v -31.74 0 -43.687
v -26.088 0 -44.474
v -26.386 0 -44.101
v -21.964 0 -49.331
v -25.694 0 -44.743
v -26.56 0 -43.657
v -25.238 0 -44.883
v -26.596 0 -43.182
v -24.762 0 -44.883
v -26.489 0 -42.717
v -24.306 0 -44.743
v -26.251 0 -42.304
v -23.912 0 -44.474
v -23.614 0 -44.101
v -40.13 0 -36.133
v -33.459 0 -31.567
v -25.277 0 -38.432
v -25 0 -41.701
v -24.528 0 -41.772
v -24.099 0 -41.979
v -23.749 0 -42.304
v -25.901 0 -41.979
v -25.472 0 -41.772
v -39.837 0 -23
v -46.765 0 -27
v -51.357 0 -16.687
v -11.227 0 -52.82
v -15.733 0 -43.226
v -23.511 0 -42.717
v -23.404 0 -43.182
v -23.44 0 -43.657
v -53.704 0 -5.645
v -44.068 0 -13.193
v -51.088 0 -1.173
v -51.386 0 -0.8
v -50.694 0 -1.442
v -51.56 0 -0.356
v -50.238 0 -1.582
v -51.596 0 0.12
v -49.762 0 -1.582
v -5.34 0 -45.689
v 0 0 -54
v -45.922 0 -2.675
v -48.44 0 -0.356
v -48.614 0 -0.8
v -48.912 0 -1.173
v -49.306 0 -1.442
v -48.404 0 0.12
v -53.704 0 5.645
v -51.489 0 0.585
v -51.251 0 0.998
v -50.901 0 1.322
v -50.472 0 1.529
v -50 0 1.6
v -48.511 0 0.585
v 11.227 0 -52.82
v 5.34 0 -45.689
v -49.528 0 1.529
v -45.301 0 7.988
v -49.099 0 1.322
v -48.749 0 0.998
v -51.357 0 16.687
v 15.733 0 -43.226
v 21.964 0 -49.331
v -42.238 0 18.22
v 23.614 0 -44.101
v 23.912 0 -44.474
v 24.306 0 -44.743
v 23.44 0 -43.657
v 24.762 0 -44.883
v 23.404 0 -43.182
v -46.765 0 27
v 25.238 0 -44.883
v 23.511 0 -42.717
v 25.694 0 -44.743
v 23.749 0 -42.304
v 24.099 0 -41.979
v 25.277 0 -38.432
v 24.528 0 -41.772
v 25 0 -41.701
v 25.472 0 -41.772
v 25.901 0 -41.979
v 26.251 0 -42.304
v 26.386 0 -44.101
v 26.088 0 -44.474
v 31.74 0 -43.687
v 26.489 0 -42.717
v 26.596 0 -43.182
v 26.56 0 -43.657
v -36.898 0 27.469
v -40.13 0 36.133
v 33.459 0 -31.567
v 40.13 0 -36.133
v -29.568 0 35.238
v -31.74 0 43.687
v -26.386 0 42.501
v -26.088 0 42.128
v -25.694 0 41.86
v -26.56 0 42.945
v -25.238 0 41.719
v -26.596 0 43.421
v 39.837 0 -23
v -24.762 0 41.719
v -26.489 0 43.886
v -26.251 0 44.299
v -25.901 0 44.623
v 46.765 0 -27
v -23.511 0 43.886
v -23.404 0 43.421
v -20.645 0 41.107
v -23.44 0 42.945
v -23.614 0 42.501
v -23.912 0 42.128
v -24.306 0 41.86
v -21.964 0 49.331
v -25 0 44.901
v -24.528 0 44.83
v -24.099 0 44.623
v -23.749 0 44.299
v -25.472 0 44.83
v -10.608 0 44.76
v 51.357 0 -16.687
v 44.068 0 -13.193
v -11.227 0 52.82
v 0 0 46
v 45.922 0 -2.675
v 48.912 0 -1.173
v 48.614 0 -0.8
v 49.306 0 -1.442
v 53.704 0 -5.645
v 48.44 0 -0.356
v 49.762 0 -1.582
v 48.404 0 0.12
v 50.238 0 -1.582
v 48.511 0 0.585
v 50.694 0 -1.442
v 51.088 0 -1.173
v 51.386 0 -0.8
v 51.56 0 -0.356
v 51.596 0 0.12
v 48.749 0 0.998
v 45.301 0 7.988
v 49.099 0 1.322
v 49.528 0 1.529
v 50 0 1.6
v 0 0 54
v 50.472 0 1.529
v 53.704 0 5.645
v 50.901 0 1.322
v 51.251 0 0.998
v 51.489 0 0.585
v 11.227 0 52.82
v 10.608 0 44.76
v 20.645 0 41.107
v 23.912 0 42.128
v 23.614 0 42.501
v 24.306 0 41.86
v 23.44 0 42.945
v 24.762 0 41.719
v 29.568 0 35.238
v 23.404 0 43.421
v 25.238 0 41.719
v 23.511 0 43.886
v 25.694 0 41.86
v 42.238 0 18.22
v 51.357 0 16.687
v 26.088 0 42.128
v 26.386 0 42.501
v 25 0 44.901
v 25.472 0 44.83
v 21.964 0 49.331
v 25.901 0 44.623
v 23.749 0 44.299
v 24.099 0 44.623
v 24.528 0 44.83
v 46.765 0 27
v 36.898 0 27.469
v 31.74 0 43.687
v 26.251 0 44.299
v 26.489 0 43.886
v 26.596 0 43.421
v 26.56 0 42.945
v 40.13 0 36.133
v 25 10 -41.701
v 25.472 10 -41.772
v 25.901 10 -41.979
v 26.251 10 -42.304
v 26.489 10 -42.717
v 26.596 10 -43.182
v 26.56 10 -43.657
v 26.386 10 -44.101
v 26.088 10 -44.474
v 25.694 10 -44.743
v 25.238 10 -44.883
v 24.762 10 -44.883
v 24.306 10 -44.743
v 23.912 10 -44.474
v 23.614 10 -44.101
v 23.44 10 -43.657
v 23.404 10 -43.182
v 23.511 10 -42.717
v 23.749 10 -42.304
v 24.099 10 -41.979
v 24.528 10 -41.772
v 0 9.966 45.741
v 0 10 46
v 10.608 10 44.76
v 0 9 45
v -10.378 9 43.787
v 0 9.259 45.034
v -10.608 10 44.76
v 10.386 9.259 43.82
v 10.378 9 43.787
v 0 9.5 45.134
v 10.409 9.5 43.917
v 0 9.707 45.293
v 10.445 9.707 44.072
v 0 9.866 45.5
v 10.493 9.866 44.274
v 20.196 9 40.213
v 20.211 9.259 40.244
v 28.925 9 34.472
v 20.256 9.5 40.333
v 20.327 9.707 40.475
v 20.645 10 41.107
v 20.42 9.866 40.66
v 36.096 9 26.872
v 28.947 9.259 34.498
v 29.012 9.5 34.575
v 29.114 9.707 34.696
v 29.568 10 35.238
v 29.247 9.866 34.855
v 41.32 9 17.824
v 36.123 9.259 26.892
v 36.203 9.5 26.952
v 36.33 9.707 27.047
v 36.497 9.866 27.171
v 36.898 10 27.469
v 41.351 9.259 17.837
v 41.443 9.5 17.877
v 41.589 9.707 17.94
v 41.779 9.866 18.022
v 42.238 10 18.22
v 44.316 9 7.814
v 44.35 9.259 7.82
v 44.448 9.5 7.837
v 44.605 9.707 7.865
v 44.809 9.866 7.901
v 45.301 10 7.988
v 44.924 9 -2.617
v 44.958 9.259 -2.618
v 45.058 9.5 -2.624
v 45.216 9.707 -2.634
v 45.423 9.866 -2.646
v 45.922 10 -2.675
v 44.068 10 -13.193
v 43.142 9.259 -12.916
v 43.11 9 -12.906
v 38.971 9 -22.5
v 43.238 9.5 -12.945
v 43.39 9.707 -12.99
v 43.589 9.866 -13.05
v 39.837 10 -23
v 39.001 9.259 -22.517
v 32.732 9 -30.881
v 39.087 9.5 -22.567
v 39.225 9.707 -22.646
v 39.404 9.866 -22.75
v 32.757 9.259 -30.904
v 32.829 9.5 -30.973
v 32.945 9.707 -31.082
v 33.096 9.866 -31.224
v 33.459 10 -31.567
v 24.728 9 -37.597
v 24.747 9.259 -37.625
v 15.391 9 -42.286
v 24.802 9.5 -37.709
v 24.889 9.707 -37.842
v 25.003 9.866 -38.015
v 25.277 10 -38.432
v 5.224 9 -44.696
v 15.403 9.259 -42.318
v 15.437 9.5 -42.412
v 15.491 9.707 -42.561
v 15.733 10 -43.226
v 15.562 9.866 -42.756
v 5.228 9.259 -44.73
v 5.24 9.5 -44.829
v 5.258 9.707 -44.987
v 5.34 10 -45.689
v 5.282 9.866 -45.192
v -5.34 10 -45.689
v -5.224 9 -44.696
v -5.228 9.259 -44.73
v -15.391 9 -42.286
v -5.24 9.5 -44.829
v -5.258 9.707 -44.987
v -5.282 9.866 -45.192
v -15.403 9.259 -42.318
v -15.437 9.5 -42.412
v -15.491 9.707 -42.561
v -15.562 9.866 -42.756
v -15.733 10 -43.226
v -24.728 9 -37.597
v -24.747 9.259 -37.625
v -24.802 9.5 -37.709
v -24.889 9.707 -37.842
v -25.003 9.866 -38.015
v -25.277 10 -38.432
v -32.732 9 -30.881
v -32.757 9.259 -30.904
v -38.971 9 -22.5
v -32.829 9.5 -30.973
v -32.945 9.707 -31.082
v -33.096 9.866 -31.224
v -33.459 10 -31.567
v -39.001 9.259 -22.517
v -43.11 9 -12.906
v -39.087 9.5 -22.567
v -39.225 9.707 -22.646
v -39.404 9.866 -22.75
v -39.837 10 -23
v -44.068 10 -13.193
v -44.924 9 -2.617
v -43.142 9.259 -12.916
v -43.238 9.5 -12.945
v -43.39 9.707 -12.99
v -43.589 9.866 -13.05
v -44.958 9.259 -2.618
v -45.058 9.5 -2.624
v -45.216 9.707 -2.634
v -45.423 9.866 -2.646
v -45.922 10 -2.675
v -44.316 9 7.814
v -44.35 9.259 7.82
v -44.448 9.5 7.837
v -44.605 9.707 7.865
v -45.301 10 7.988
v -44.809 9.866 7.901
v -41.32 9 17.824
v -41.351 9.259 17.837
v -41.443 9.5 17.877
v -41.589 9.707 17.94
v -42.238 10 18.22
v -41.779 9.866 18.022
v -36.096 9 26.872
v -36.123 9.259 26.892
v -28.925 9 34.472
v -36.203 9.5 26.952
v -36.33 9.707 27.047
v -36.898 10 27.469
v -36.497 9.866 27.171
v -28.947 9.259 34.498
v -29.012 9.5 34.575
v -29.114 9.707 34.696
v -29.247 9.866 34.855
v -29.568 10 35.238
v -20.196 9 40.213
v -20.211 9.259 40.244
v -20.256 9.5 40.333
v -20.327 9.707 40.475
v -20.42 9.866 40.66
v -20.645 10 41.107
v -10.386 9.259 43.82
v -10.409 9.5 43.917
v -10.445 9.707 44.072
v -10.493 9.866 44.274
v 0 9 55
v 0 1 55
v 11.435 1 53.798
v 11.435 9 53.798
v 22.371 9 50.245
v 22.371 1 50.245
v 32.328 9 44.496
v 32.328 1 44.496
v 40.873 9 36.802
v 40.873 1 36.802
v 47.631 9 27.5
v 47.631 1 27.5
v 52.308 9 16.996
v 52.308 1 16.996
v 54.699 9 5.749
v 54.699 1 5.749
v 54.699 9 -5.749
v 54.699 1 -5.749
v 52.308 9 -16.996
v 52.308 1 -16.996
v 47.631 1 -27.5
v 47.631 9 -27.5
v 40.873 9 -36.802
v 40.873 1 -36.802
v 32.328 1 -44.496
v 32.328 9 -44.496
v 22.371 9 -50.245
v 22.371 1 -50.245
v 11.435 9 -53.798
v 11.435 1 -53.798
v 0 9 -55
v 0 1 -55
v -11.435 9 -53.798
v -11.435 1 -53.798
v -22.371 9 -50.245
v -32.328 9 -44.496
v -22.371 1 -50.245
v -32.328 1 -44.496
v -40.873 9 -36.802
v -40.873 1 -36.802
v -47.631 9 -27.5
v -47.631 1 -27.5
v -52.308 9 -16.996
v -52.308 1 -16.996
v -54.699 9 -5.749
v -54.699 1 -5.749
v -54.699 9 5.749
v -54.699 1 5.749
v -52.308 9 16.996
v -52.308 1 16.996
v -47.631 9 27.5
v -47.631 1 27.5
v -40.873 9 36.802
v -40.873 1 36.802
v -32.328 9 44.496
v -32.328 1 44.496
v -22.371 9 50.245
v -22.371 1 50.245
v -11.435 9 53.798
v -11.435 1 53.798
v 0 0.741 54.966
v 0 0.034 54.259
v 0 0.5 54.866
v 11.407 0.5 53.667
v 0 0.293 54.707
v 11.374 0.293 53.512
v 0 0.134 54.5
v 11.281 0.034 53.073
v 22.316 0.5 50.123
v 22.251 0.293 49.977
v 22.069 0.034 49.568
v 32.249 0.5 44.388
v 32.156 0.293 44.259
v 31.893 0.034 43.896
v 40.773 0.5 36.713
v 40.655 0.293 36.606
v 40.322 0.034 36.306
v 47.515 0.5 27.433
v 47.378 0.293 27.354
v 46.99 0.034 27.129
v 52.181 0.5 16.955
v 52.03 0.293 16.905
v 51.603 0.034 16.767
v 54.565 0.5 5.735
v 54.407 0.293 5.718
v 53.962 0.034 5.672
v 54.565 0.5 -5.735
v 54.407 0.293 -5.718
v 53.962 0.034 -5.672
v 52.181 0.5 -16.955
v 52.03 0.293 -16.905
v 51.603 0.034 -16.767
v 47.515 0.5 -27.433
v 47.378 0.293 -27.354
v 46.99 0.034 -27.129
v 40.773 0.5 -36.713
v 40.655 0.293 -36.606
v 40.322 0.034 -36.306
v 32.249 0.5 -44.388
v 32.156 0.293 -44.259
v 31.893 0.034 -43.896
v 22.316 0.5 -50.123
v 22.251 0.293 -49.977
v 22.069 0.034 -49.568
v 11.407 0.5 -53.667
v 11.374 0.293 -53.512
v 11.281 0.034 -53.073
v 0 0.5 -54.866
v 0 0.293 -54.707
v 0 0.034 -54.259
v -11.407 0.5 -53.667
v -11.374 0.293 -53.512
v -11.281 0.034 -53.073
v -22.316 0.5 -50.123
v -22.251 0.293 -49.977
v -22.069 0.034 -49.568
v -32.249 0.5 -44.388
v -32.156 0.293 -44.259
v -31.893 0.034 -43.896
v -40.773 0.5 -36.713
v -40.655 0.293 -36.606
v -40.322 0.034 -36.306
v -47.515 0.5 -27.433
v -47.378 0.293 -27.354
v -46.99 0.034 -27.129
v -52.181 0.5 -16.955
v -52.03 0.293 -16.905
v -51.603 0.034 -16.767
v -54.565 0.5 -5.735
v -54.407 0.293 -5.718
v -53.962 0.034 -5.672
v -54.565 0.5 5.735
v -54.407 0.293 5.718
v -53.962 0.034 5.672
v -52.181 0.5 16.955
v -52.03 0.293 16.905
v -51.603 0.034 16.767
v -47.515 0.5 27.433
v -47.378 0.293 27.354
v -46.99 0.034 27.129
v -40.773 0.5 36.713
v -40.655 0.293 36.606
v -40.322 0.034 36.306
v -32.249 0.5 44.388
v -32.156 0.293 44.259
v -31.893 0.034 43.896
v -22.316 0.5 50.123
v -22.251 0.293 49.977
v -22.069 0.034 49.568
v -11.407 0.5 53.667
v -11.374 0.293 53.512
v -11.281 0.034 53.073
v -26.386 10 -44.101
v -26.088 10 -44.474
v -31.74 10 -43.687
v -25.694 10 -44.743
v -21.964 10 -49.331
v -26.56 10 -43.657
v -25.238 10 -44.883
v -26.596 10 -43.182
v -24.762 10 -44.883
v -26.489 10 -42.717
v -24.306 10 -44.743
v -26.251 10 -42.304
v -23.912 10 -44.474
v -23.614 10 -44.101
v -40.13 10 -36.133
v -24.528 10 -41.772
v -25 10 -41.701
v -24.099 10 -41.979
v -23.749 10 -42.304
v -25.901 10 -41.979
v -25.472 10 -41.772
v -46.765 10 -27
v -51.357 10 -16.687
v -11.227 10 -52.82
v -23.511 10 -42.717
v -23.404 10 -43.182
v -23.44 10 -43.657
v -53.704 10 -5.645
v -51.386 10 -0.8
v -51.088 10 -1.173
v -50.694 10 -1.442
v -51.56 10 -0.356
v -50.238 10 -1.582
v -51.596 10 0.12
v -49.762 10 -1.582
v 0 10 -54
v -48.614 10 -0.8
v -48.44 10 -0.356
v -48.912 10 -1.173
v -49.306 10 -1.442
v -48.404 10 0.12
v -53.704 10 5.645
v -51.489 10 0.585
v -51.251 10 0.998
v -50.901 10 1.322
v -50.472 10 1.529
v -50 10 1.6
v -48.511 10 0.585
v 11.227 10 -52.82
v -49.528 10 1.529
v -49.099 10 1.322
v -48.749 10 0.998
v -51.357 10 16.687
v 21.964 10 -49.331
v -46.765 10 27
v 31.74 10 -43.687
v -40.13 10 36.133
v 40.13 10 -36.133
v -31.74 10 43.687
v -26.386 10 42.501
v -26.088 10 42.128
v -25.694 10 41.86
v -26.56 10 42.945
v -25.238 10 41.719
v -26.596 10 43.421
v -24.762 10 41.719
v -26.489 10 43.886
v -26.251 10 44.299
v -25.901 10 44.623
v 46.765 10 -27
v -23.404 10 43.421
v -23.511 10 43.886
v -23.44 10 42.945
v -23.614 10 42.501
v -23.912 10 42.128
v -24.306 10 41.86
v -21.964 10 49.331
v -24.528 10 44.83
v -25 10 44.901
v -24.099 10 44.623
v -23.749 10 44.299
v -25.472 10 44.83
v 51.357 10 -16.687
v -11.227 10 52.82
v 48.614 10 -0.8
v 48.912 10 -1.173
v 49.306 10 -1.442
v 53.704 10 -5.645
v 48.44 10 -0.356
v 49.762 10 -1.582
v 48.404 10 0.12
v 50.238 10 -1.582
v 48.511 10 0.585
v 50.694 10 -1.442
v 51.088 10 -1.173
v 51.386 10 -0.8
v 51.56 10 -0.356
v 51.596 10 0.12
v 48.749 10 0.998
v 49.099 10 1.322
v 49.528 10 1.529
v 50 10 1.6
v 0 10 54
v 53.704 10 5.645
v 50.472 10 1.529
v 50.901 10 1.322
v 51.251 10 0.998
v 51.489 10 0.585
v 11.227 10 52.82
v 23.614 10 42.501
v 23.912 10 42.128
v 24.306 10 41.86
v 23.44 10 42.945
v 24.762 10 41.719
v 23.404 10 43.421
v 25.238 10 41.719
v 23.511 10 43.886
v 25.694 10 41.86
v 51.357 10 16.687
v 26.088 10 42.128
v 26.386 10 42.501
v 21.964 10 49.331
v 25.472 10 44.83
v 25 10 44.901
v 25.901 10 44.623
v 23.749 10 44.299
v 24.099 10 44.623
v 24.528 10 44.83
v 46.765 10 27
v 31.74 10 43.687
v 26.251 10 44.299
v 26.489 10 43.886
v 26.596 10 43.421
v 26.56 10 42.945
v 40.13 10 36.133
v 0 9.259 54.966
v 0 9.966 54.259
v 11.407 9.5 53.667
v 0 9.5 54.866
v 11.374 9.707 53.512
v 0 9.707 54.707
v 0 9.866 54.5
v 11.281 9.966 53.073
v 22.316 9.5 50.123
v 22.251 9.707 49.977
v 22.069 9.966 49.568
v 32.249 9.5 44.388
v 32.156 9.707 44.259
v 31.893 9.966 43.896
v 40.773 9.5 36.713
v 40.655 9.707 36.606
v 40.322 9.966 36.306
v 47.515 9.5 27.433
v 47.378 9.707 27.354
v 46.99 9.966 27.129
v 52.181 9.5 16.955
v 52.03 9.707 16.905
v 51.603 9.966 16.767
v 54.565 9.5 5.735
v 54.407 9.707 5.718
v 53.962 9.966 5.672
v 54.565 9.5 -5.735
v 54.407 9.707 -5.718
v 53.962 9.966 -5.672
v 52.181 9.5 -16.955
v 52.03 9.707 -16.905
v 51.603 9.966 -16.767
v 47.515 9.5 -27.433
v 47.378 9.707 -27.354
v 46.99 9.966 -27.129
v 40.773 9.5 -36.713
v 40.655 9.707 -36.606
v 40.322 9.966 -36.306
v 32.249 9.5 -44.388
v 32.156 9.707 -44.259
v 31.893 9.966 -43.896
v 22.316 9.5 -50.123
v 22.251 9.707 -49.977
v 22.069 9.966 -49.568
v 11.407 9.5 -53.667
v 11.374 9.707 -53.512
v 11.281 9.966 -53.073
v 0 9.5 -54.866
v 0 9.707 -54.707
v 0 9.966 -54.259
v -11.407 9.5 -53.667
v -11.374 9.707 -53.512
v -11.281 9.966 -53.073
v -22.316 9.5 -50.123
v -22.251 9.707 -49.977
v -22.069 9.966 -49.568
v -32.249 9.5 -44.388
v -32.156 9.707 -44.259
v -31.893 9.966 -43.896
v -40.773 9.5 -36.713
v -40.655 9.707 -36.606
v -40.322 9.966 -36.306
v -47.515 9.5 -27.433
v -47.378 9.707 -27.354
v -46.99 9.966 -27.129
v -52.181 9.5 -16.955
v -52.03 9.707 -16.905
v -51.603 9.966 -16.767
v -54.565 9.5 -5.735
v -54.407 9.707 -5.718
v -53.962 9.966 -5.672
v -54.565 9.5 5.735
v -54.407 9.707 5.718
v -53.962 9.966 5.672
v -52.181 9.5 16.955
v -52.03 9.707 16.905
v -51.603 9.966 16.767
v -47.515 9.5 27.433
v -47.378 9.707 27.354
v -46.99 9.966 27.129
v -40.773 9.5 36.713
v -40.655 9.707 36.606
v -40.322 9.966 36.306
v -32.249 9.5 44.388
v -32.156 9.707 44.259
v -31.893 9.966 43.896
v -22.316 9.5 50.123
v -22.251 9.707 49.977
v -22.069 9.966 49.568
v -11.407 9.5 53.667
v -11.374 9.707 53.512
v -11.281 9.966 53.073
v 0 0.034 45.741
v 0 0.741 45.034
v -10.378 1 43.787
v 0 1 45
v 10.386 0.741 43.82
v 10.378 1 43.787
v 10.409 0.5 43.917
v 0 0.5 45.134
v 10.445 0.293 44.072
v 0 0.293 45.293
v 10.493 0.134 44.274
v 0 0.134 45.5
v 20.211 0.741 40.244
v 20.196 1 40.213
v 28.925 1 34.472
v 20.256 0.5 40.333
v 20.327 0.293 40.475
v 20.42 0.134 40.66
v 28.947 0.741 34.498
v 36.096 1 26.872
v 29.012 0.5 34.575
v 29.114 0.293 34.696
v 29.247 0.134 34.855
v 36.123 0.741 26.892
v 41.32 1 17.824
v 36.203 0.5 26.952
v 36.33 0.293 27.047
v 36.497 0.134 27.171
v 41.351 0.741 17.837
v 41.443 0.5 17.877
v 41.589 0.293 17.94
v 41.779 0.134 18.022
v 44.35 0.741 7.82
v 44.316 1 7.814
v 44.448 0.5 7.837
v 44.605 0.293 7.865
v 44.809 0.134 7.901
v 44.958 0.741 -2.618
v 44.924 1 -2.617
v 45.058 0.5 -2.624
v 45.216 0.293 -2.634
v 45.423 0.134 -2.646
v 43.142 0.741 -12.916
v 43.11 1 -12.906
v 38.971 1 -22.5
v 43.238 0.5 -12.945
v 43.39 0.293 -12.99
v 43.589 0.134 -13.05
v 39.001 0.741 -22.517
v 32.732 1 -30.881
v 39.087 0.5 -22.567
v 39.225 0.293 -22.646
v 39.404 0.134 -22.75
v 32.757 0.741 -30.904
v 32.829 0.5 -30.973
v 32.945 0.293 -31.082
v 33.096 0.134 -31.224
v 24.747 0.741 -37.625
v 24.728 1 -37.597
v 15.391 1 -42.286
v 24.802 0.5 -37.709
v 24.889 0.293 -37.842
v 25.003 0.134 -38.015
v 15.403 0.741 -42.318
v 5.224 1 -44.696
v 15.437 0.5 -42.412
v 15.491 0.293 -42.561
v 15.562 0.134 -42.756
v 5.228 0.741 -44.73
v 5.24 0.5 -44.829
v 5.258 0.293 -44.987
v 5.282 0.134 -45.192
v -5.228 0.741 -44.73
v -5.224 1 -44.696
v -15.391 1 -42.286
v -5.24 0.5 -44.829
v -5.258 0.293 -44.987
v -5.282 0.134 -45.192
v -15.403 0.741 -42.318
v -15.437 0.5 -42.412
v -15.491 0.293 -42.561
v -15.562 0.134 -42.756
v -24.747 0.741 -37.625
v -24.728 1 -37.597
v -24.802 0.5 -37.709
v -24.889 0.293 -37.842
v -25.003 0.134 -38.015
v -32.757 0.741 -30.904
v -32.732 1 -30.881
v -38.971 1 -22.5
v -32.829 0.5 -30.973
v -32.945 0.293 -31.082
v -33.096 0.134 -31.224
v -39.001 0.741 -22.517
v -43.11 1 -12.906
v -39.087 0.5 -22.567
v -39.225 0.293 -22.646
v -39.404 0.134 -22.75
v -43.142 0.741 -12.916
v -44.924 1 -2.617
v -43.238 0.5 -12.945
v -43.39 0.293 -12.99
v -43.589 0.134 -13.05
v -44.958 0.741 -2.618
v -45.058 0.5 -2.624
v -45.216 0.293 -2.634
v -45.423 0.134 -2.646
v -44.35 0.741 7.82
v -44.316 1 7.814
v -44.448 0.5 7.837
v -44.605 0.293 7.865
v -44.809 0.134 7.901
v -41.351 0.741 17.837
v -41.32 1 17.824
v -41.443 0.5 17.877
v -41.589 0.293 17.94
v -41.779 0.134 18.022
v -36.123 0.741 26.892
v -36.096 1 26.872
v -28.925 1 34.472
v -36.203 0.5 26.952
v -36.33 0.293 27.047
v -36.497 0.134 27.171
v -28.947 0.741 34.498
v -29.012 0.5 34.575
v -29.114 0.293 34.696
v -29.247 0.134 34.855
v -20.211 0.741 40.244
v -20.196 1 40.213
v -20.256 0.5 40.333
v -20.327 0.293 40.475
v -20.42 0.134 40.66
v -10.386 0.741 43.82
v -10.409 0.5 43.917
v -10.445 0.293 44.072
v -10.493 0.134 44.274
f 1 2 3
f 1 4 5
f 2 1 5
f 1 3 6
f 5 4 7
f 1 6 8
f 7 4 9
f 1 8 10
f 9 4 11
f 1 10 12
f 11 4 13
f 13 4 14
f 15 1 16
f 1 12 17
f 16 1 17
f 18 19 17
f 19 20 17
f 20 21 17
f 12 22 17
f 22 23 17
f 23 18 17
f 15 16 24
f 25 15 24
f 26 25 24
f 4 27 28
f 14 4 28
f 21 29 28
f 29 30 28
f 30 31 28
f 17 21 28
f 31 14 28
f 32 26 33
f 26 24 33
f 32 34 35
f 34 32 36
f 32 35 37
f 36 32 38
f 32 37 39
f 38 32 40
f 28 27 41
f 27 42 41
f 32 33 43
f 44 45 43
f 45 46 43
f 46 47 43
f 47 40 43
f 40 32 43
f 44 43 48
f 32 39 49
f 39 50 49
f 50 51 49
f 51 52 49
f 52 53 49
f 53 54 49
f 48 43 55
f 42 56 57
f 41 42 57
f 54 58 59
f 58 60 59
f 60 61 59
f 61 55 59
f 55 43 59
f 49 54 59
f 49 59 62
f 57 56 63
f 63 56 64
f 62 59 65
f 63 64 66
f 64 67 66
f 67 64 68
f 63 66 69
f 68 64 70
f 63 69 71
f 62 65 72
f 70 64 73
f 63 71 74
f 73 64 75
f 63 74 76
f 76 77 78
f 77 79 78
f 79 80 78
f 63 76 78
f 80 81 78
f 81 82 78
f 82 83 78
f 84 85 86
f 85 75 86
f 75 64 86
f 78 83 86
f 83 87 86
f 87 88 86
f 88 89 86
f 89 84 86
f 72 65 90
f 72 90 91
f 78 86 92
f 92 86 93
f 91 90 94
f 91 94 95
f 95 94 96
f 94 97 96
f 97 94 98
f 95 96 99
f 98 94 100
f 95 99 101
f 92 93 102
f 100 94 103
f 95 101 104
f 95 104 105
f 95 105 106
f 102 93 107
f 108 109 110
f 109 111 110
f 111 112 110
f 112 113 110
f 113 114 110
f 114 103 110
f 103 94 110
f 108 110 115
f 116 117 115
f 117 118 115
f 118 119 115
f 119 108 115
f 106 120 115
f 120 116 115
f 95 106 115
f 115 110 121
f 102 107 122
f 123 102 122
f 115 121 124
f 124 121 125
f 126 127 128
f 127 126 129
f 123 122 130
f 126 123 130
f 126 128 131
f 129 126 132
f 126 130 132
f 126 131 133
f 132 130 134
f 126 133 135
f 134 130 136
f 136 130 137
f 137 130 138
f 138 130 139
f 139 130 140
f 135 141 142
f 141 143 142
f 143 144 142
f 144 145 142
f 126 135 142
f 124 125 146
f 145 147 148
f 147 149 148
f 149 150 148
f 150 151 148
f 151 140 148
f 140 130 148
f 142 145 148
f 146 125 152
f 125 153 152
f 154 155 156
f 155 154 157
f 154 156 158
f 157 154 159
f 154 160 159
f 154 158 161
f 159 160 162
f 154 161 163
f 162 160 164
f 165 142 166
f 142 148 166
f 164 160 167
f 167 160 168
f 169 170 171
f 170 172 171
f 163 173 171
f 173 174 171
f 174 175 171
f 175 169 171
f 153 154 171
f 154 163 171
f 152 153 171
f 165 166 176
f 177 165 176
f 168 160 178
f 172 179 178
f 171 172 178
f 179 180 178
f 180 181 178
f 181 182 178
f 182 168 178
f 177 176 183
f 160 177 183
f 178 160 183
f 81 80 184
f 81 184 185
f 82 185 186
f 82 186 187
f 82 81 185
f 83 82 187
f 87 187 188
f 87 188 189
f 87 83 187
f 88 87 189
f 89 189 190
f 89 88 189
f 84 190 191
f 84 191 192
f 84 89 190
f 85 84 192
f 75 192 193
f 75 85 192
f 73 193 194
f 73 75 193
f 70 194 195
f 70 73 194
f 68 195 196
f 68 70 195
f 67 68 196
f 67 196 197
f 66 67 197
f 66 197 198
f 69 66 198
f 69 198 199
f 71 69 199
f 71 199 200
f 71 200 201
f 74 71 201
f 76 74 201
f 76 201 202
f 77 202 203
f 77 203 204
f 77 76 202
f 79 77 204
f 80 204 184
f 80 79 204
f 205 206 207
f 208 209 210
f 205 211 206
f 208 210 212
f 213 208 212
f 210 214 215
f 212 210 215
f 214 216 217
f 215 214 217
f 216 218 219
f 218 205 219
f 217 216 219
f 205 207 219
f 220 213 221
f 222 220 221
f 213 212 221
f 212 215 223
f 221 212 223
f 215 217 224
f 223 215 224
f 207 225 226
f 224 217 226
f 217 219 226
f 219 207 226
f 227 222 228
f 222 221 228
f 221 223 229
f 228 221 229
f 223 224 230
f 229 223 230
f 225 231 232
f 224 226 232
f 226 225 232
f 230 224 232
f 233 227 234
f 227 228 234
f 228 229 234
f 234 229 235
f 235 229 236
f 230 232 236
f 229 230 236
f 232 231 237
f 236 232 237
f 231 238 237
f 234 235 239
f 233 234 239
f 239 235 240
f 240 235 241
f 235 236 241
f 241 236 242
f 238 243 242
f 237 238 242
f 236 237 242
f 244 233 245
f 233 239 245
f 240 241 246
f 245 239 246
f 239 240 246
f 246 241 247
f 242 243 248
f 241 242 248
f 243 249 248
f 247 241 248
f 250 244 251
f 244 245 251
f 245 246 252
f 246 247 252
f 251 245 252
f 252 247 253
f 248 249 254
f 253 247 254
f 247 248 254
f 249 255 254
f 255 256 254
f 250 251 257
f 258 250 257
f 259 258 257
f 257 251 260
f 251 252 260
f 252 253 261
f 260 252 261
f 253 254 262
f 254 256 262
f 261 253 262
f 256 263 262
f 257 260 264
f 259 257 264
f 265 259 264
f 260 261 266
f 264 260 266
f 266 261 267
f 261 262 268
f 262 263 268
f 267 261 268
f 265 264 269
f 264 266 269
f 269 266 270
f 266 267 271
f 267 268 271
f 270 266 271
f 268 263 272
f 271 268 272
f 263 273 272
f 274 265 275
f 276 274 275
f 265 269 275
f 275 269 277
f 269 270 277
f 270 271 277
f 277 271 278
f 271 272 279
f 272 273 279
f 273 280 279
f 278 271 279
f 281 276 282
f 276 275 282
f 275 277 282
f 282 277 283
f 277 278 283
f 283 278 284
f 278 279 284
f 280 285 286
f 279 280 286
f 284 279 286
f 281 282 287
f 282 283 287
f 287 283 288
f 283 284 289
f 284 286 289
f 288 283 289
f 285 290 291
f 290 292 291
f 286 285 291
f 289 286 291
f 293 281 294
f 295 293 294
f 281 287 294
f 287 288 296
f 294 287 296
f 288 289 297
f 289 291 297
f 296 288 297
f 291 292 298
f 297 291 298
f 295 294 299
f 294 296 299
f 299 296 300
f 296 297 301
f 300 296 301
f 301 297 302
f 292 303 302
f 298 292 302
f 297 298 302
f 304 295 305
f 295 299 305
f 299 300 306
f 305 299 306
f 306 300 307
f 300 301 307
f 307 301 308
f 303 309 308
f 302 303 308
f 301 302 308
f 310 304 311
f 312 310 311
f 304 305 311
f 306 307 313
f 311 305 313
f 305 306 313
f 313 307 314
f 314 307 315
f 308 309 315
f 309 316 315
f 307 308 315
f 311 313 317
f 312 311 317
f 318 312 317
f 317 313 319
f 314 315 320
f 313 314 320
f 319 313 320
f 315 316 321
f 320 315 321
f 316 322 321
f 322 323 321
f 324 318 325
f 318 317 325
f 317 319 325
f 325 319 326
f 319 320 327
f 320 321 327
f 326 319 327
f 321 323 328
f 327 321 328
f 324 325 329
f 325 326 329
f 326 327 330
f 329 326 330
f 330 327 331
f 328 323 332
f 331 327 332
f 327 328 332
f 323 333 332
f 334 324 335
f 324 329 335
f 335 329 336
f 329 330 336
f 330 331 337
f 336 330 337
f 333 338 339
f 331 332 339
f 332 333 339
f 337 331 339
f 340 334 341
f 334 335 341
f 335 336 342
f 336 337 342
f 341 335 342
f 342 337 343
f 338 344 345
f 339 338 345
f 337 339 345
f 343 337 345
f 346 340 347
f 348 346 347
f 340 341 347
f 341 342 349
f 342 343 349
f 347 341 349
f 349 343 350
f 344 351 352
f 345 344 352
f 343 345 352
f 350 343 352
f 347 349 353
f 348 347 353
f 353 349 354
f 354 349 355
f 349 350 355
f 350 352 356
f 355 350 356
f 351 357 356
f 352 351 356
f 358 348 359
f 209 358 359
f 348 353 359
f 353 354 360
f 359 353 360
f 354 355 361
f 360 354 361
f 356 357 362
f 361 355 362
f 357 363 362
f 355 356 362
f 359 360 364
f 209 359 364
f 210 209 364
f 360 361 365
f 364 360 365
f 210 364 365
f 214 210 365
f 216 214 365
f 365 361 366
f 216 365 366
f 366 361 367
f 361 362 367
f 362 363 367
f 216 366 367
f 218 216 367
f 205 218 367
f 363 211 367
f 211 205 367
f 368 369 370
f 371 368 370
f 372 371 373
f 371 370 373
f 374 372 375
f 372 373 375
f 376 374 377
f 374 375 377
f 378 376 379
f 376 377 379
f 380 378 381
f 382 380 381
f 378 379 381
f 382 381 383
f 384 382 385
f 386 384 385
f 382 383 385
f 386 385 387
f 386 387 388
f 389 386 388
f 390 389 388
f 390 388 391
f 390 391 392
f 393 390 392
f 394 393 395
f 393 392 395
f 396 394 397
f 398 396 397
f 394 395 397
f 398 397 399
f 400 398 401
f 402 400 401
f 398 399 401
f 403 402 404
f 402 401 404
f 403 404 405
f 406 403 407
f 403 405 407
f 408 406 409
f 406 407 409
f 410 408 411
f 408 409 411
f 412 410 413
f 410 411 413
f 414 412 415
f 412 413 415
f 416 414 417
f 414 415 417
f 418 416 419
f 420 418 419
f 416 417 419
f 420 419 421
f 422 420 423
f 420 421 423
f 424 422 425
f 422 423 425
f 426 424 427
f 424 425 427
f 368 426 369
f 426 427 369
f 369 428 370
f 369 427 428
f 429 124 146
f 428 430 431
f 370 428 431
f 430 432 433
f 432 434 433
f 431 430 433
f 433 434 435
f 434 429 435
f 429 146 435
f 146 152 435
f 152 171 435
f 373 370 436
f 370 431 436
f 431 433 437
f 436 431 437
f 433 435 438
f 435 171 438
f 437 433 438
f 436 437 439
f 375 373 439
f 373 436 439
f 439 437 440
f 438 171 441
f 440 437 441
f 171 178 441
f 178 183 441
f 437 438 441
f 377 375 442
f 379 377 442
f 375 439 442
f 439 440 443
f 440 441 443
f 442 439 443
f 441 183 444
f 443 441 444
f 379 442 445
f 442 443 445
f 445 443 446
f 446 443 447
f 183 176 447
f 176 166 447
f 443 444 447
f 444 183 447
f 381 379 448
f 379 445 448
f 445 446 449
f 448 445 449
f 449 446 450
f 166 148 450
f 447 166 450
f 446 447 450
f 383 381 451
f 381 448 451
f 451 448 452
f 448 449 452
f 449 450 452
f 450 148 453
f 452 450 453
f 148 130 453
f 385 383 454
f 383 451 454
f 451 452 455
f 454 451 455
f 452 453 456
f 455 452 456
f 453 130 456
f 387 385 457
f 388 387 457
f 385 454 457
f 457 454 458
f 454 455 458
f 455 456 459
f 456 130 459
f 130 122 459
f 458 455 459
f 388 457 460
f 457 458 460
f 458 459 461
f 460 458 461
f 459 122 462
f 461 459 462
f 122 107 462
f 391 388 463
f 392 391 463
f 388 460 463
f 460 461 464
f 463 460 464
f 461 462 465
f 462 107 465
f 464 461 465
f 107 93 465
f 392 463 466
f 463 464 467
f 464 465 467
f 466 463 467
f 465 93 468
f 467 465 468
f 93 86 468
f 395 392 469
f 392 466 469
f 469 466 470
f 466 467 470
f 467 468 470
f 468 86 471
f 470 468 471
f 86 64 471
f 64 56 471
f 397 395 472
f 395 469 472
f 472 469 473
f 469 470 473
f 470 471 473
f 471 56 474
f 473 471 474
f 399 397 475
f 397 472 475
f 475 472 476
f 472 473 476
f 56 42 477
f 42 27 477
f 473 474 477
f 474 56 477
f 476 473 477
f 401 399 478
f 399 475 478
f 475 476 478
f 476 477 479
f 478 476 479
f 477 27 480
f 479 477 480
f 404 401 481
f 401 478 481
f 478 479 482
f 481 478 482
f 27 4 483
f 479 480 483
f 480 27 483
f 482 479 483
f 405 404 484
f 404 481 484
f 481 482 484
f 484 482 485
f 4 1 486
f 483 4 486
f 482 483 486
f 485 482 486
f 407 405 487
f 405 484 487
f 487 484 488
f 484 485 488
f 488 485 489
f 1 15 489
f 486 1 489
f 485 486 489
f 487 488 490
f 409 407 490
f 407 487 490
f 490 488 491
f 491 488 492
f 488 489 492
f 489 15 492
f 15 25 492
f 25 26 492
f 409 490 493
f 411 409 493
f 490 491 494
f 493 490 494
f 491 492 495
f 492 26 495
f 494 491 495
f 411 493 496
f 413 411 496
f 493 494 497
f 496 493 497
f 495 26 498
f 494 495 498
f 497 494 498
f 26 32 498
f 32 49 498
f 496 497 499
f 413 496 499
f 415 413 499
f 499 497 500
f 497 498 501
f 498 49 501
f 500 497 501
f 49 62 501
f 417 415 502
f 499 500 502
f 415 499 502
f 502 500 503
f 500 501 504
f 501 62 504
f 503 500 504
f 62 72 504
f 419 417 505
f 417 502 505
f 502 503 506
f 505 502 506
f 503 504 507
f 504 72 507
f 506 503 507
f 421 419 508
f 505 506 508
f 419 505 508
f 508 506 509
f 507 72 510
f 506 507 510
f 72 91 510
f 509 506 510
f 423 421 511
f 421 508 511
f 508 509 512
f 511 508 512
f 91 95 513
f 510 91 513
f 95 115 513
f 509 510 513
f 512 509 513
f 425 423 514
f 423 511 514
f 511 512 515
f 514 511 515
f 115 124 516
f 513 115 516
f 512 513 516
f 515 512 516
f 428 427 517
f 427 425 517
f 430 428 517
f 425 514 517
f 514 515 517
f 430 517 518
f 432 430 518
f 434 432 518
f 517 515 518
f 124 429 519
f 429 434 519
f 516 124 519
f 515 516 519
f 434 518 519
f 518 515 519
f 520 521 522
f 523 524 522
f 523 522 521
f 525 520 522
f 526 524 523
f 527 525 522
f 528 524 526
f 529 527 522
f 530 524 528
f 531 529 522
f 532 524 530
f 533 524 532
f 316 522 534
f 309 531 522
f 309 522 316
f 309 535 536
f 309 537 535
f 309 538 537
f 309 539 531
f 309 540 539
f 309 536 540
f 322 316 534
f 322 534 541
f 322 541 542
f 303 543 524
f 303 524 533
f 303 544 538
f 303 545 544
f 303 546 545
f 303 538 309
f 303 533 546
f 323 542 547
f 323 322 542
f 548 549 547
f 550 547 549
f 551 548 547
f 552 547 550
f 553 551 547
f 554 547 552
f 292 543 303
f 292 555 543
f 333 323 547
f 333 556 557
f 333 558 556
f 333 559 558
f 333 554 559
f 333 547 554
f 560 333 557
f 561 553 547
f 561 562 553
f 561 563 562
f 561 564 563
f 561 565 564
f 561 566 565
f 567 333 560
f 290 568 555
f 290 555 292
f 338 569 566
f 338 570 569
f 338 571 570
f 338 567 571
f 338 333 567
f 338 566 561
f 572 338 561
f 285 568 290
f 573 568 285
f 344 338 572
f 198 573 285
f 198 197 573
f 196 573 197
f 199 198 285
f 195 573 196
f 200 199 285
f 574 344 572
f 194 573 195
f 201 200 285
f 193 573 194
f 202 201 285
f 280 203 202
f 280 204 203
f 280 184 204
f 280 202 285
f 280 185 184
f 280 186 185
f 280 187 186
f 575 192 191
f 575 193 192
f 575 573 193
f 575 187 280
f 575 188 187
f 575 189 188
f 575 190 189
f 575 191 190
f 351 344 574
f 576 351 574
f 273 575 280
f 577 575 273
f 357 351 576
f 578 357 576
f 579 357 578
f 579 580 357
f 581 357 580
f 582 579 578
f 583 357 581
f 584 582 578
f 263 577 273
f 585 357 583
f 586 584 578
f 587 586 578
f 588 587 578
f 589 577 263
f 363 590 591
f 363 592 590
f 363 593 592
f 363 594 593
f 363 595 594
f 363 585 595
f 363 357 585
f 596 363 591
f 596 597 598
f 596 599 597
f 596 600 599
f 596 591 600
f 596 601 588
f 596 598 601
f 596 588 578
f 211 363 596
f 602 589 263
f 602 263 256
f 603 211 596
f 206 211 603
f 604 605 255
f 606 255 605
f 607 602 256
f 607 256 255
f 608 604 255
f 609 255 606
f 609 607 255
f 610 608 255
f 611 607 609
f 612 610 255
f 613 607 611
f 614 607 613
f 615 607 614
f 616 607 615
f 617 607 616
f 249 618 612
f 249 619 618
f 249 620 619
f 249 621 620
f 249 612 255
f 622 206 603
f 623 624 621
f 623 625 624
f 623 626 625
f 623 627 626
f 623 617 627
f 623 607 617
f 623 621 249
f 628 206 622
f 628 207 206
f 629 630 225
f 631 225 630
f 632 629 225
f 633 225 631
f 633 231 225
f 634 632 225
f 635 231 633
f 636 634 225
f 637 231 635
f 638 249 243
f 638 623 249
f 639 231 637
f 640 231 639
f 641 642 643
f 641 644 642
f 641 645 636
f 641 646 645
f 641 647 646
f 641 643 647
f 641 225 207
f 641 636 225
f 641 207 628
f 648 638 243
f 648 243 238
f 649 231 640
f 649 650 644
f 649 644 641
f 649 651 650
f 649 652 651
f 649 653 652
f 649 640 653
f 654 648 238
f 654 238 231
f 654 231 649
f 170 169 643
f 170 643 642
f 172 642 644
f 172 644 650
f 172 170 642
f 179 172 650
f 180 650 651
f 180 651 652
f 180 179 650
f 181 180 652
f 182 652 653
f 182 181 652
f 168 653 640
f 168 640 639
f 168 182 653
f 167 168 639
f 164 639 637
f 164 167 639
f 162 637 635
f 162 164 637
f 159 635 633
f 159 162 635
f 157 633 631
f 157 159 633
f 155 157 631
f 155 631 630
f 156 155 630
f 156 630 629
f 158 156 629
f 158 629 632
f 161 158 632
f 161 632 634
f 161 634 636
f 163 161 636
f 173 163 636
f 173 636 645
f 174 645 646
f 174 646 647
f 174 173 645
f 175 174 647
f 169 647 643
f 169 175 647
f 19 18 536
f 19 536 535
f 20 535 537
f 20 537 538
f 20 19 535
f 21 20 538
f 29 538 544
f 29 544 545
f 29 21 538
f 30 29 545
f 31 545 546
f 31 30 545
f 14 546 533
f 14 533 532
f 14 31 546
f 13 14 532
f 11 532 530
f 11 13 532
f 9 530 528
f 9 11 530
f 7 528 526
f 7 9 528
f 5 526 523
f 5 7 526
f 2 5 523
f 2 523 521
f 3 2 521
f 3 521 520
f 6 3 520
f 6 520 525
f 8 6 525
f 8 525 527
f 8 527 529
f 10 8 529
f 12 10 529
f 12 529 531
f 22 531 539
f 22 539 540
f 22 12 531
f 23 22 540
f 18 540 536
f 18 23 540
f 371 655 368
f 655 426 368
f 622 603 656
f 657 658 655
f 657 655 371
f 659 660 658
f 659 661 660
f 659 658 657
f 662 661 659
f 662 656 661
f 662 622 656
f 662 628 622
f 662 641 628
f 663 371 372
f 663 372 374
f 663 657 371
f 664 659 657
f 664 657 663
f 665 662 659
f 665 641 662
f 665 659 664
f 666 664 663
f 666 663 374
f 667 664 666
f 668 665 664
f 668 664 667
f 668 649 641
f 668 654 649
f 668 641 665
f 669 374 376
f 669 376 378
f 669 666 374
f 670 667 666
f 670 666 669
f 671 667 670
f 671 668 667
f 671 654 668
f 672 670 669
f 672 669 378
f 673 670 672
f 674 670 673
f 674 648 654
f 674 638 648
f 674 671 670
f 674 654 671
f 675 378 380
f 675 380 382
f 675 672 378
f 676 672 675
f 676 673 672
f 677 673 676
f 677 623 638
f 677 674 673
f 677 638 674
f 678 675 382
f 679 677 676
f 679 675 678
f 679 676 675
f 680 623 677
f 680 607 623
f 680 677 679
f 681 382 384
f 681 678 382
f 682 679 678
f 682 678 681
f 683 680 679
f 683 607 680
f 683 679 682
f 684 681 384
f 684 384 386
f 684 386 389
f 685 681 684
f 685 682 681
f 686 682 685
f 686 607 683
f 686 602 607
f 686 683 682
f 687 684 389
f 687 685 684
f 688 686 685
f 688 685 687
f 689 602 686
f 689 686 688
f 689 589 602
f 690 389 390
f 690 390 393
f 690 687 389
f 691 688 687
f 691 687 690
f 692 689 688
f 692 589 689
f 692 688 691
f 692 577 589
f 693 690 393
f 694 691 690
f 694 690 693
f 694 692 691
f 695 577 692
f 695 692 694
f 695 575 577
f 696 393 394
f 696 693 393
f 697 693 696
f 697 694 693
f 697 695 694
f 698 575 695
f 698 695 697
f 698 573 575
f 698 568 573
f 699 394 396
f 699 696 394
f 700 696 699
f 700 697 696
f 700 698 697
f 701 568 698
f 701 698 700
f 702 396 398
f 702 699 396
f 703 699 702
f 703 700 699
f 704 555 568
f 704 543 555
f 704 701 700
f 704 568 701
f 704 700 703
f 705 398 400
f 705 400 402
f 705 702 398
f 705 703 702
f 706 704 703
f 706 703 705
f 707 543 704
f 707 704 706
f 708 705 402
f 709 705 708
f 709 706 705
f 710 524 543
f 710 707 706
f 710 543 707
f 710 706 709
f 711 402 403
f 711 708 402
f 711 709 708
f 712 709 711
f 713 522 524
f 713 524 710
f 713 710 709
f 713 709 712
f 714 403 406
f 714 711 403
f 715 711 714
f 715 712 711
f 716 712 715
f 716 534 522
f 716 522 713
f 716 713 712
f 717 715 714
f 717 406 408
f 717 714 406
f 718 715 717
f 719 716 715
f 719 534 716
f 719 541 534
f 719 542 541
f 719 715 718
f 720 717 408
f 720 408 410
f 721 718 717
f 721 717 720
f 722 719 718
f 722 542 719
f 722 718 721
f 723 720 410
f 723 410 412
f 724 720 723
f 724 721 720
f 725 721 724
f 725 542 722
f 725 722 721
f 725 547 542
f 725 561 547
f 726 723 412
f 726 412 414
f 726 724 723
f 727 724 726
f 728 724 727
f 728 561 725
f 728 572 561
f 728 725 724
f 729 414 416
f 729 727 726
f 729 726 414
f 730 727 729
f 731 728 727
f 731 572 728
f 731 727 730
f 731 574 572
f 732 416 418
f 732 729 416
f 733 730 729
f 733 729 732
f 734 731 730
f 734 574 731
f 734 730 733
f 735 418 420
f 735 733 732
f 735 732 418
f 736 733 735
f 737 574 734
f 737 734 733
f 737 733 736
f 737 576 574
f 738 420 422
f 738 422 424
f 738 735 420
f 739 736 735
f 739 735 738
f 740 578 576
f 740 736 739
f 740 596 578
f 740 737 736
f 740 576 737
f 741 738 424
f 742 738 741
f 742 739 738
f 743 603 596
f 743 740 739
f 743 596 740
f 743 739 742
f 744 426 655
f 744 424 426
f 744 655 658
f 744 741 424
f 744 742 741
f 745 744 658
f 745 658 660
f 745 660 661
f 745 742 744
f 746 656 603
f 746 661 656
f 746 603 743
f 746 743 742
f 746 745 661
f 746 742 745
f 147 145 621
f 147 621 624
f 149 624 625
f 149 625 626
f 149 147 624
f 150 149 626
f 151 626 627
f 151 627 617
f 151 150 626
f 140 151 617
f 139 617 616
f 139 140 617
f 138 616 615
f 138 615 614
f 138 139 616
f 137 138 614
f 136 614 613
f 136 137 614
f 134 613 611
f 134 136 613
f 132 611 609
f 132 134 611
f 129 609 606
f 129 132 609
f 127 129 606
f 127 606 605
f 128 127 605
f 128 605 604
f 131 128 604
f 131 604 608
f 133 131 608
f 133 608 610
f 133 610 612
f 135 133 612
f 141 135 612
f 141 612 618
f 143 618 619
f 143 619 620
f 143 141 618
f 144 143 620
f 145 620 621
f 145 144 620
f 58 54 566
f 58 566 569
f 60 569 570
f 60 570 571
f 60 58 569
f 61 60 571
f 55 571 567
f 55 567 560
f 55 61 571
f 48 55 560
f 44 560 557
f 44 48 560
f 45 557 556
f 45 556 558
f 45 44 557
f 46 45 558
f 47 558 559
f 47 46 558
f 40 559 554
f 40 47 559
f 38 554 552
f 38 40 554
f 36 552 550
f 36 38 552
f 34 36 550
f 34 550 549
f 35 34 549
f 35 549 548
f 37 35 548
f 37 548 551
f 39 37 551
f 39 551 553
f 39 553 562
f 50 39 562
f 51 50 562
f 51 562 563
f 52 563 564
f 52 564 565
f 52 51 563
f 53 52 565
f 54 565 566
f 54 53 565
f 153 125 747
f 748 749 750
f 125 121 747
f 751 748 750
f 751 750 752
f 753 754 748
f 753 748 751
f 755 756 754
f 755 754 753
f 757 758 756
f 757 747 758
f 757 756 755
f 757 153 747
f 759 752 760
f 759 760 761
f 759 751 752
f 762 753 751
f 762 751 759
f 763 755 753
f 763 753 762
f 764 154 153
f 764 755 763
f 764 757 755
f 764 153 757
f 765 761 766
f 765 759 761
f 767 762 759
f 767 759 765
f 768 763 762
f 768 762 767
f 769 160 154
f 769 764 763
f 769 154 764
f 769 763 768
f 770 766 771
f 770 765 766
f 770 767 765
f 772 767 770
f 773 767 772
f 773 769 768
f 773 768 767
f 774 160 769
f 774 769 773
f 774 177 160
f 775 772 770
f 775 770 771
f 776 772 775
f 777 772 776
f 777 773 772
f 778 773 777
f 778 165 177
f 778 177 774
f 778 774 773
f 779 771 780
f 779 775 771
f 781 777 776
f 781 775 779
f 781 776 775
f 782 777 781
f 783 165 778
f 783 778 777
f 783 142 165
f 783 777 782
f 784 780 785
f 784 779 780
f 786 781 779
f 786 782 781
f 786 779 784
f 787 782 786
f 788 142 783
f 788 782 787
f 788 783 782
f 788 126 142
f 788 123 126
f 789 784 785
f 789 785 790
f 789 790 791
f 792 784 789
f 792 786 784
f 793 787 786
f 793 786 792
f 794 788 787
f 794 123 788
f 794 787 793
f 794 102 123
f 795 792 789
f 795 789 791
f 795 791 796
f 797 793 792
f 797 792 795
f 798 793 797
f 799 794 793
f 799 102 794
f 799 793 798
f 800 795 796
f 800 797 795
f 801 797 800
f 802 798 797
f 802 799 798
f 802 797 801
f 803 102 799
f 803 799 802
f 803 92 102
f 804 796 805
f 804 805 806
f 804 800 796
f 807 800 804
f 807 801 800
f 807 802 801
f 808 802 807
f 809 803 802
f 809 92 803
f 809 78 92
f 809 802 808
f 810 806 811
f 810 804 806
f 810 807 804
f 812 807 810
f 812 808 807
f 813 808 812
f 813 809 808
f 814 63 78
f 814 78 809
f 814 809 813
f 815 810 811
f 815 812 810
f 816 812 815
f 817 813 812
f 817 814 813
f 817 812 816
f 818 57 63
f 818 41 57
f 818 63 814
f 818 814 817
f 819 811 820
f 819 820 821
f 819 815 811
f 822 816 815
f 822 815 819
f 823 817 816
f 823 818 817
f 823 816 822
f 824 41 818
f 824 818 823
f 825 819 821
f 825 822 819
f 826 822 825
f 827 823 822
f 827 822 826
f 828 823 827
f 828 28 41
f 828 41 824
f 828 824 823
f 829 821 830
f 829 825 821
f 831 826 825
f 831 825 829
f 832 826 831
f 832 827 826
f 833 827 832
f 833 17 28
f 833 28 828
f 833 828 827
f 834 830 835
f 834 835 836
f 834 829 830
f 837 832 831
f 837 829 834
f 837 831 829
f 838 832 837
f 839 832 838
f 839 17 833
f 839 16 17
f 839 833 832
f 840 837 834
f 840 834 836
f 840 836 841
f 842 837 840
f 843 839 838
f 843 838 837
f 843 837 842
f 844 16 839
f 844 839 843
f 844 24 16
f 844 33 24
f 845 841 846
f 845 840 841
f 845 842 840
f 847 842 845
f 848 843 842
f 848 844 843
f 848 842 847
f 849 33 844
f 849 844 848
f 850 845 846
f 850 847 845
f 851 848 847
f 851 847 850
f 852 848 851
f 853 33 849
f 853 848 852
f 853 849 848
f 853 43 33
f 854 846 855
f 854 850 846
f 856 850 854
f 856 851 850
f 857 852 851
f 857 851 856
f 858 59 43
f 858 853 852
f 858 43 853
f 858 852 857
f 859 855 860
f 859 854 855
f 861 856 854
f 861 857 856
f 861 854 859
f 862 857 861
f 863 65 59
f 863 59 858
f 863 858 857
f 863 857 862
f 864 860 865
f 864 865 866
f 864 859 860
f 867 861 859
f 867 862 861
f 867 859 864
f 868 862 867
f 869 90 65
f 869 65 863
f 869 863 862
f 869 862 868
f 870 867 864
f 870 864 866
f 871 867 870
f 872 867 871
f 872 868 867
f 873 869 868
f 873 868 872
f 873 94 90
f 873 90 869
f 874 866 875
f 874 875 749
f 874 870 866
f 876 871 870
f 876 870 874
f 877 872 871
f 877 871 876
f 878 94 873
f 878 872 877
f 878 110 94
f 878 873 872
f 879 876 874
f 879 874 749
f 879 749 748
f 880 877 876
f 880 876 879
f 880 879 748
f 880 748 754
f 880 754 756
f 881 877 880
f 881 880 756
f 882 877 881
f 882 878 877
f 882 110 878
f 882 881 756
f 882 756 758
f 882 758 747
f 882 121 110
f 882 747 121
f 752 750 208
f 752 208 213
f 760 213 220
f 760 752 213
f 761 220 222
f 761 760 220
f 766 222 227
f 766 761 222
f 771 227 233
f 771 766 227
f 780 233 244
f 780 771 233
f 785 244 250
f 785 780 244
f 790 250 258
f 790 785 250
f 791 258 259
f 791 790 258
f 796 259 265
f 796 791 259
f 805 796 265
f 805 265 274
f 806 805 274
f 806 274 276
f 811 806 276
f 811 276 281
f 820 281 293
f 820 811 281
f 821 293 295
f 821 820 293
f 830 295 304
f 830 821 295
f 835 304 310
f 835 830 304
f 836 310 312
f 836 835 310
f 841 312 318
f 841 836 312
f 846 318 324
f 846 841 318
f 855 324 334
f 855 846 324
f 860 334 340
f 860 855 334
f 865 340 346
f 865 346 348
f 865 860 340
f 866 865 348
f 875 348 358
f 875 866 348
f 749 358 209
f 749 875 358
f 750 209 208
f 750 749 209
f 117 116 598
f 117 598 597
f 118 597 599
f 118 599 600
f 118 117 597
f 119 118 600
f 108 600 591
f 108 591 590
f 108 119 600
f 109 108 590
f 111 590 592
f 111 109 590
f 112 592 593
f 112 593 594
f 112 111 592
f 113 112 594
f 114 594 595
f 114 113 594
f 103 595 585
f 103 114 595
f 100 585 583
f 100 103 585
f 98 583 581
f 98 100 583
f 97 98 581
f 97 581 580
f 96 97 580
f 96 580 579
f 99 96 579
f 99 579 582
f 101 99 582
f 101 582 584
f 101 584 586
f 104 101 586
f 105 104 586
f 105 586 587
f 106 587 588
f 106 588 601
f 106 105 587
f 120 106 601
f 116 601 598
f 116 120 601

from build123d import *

# Parameters (mm, degrees)
SKETCH_1_R      = 55
SKETCH_1_R_2    = 45
SKETCH_1_R_3    = 1.6
EXTRUDE_1_DEPTH = 10
FILLET_1_R      = 1


with BuildPart() as part:
    # 草图1 → 凸台-拉伸1 (new body)
    with BuildSketch(Plane(origin=(0, 0, 0), x_dir=(1, 0, 0), z_dir=(0, 1, 0))):
        with Locations(Location((0, 0, 0), (0, 0, 270))):
            Circle(SKETCH_1_R)
        with Locations(Location((0, 0, 0), (0, 0, 270))):
            Circle(SKETCH_1_R_2, mode=Mode.SUBTRACT)
        with Locations(Location((50, 0, 0), (0, 0, 270))):
            Circle(SKETCH_1_R_3, mode=Mode.SUBTRACT)
        with Locations(Location((25, -43.301270189, 0), (0, 0, 270))):
            Circle(SKETCH_1_R_3, mode=Mode.SUBTRACT)
        with Locations(Location((-25, -43.301270189, 0), (0, 0, 270))):
            Circle(SKETCH_1_R_3, mode=Mode.SUBTRACT)
        with Locations(Location((-50, 0, 0), (0, 0, 270))):
            Circle(SKETCH_1_R_3, mode=Mode.SUBTRACT)
        with Locations(Location((-25, 43.301270189, 0), (0, 0, 270))):
            Circle(SKETCH_1_R_3, mode=Mode.SUBTRACT)
        with Locations(Location((25, 43.301270189, 0), (0, 0, 270))):
            Circle(SKETCH_1_R_3, mode=Mode.SUBTRACT)
    extrude(amount=EXTRUDE_1_DEPTH)

    # 圆角1
    fillet_1_edges = [part.edges().sort_by_distance(p)[0] for p in [
        (0, 0, -55),
        (0, 10, -55),
        (0, 0, -45),
        (0, 10, -45),
    ]]
    fillet(fillet_1_edges, radius=FILLET_1_R)


solid = part.part
